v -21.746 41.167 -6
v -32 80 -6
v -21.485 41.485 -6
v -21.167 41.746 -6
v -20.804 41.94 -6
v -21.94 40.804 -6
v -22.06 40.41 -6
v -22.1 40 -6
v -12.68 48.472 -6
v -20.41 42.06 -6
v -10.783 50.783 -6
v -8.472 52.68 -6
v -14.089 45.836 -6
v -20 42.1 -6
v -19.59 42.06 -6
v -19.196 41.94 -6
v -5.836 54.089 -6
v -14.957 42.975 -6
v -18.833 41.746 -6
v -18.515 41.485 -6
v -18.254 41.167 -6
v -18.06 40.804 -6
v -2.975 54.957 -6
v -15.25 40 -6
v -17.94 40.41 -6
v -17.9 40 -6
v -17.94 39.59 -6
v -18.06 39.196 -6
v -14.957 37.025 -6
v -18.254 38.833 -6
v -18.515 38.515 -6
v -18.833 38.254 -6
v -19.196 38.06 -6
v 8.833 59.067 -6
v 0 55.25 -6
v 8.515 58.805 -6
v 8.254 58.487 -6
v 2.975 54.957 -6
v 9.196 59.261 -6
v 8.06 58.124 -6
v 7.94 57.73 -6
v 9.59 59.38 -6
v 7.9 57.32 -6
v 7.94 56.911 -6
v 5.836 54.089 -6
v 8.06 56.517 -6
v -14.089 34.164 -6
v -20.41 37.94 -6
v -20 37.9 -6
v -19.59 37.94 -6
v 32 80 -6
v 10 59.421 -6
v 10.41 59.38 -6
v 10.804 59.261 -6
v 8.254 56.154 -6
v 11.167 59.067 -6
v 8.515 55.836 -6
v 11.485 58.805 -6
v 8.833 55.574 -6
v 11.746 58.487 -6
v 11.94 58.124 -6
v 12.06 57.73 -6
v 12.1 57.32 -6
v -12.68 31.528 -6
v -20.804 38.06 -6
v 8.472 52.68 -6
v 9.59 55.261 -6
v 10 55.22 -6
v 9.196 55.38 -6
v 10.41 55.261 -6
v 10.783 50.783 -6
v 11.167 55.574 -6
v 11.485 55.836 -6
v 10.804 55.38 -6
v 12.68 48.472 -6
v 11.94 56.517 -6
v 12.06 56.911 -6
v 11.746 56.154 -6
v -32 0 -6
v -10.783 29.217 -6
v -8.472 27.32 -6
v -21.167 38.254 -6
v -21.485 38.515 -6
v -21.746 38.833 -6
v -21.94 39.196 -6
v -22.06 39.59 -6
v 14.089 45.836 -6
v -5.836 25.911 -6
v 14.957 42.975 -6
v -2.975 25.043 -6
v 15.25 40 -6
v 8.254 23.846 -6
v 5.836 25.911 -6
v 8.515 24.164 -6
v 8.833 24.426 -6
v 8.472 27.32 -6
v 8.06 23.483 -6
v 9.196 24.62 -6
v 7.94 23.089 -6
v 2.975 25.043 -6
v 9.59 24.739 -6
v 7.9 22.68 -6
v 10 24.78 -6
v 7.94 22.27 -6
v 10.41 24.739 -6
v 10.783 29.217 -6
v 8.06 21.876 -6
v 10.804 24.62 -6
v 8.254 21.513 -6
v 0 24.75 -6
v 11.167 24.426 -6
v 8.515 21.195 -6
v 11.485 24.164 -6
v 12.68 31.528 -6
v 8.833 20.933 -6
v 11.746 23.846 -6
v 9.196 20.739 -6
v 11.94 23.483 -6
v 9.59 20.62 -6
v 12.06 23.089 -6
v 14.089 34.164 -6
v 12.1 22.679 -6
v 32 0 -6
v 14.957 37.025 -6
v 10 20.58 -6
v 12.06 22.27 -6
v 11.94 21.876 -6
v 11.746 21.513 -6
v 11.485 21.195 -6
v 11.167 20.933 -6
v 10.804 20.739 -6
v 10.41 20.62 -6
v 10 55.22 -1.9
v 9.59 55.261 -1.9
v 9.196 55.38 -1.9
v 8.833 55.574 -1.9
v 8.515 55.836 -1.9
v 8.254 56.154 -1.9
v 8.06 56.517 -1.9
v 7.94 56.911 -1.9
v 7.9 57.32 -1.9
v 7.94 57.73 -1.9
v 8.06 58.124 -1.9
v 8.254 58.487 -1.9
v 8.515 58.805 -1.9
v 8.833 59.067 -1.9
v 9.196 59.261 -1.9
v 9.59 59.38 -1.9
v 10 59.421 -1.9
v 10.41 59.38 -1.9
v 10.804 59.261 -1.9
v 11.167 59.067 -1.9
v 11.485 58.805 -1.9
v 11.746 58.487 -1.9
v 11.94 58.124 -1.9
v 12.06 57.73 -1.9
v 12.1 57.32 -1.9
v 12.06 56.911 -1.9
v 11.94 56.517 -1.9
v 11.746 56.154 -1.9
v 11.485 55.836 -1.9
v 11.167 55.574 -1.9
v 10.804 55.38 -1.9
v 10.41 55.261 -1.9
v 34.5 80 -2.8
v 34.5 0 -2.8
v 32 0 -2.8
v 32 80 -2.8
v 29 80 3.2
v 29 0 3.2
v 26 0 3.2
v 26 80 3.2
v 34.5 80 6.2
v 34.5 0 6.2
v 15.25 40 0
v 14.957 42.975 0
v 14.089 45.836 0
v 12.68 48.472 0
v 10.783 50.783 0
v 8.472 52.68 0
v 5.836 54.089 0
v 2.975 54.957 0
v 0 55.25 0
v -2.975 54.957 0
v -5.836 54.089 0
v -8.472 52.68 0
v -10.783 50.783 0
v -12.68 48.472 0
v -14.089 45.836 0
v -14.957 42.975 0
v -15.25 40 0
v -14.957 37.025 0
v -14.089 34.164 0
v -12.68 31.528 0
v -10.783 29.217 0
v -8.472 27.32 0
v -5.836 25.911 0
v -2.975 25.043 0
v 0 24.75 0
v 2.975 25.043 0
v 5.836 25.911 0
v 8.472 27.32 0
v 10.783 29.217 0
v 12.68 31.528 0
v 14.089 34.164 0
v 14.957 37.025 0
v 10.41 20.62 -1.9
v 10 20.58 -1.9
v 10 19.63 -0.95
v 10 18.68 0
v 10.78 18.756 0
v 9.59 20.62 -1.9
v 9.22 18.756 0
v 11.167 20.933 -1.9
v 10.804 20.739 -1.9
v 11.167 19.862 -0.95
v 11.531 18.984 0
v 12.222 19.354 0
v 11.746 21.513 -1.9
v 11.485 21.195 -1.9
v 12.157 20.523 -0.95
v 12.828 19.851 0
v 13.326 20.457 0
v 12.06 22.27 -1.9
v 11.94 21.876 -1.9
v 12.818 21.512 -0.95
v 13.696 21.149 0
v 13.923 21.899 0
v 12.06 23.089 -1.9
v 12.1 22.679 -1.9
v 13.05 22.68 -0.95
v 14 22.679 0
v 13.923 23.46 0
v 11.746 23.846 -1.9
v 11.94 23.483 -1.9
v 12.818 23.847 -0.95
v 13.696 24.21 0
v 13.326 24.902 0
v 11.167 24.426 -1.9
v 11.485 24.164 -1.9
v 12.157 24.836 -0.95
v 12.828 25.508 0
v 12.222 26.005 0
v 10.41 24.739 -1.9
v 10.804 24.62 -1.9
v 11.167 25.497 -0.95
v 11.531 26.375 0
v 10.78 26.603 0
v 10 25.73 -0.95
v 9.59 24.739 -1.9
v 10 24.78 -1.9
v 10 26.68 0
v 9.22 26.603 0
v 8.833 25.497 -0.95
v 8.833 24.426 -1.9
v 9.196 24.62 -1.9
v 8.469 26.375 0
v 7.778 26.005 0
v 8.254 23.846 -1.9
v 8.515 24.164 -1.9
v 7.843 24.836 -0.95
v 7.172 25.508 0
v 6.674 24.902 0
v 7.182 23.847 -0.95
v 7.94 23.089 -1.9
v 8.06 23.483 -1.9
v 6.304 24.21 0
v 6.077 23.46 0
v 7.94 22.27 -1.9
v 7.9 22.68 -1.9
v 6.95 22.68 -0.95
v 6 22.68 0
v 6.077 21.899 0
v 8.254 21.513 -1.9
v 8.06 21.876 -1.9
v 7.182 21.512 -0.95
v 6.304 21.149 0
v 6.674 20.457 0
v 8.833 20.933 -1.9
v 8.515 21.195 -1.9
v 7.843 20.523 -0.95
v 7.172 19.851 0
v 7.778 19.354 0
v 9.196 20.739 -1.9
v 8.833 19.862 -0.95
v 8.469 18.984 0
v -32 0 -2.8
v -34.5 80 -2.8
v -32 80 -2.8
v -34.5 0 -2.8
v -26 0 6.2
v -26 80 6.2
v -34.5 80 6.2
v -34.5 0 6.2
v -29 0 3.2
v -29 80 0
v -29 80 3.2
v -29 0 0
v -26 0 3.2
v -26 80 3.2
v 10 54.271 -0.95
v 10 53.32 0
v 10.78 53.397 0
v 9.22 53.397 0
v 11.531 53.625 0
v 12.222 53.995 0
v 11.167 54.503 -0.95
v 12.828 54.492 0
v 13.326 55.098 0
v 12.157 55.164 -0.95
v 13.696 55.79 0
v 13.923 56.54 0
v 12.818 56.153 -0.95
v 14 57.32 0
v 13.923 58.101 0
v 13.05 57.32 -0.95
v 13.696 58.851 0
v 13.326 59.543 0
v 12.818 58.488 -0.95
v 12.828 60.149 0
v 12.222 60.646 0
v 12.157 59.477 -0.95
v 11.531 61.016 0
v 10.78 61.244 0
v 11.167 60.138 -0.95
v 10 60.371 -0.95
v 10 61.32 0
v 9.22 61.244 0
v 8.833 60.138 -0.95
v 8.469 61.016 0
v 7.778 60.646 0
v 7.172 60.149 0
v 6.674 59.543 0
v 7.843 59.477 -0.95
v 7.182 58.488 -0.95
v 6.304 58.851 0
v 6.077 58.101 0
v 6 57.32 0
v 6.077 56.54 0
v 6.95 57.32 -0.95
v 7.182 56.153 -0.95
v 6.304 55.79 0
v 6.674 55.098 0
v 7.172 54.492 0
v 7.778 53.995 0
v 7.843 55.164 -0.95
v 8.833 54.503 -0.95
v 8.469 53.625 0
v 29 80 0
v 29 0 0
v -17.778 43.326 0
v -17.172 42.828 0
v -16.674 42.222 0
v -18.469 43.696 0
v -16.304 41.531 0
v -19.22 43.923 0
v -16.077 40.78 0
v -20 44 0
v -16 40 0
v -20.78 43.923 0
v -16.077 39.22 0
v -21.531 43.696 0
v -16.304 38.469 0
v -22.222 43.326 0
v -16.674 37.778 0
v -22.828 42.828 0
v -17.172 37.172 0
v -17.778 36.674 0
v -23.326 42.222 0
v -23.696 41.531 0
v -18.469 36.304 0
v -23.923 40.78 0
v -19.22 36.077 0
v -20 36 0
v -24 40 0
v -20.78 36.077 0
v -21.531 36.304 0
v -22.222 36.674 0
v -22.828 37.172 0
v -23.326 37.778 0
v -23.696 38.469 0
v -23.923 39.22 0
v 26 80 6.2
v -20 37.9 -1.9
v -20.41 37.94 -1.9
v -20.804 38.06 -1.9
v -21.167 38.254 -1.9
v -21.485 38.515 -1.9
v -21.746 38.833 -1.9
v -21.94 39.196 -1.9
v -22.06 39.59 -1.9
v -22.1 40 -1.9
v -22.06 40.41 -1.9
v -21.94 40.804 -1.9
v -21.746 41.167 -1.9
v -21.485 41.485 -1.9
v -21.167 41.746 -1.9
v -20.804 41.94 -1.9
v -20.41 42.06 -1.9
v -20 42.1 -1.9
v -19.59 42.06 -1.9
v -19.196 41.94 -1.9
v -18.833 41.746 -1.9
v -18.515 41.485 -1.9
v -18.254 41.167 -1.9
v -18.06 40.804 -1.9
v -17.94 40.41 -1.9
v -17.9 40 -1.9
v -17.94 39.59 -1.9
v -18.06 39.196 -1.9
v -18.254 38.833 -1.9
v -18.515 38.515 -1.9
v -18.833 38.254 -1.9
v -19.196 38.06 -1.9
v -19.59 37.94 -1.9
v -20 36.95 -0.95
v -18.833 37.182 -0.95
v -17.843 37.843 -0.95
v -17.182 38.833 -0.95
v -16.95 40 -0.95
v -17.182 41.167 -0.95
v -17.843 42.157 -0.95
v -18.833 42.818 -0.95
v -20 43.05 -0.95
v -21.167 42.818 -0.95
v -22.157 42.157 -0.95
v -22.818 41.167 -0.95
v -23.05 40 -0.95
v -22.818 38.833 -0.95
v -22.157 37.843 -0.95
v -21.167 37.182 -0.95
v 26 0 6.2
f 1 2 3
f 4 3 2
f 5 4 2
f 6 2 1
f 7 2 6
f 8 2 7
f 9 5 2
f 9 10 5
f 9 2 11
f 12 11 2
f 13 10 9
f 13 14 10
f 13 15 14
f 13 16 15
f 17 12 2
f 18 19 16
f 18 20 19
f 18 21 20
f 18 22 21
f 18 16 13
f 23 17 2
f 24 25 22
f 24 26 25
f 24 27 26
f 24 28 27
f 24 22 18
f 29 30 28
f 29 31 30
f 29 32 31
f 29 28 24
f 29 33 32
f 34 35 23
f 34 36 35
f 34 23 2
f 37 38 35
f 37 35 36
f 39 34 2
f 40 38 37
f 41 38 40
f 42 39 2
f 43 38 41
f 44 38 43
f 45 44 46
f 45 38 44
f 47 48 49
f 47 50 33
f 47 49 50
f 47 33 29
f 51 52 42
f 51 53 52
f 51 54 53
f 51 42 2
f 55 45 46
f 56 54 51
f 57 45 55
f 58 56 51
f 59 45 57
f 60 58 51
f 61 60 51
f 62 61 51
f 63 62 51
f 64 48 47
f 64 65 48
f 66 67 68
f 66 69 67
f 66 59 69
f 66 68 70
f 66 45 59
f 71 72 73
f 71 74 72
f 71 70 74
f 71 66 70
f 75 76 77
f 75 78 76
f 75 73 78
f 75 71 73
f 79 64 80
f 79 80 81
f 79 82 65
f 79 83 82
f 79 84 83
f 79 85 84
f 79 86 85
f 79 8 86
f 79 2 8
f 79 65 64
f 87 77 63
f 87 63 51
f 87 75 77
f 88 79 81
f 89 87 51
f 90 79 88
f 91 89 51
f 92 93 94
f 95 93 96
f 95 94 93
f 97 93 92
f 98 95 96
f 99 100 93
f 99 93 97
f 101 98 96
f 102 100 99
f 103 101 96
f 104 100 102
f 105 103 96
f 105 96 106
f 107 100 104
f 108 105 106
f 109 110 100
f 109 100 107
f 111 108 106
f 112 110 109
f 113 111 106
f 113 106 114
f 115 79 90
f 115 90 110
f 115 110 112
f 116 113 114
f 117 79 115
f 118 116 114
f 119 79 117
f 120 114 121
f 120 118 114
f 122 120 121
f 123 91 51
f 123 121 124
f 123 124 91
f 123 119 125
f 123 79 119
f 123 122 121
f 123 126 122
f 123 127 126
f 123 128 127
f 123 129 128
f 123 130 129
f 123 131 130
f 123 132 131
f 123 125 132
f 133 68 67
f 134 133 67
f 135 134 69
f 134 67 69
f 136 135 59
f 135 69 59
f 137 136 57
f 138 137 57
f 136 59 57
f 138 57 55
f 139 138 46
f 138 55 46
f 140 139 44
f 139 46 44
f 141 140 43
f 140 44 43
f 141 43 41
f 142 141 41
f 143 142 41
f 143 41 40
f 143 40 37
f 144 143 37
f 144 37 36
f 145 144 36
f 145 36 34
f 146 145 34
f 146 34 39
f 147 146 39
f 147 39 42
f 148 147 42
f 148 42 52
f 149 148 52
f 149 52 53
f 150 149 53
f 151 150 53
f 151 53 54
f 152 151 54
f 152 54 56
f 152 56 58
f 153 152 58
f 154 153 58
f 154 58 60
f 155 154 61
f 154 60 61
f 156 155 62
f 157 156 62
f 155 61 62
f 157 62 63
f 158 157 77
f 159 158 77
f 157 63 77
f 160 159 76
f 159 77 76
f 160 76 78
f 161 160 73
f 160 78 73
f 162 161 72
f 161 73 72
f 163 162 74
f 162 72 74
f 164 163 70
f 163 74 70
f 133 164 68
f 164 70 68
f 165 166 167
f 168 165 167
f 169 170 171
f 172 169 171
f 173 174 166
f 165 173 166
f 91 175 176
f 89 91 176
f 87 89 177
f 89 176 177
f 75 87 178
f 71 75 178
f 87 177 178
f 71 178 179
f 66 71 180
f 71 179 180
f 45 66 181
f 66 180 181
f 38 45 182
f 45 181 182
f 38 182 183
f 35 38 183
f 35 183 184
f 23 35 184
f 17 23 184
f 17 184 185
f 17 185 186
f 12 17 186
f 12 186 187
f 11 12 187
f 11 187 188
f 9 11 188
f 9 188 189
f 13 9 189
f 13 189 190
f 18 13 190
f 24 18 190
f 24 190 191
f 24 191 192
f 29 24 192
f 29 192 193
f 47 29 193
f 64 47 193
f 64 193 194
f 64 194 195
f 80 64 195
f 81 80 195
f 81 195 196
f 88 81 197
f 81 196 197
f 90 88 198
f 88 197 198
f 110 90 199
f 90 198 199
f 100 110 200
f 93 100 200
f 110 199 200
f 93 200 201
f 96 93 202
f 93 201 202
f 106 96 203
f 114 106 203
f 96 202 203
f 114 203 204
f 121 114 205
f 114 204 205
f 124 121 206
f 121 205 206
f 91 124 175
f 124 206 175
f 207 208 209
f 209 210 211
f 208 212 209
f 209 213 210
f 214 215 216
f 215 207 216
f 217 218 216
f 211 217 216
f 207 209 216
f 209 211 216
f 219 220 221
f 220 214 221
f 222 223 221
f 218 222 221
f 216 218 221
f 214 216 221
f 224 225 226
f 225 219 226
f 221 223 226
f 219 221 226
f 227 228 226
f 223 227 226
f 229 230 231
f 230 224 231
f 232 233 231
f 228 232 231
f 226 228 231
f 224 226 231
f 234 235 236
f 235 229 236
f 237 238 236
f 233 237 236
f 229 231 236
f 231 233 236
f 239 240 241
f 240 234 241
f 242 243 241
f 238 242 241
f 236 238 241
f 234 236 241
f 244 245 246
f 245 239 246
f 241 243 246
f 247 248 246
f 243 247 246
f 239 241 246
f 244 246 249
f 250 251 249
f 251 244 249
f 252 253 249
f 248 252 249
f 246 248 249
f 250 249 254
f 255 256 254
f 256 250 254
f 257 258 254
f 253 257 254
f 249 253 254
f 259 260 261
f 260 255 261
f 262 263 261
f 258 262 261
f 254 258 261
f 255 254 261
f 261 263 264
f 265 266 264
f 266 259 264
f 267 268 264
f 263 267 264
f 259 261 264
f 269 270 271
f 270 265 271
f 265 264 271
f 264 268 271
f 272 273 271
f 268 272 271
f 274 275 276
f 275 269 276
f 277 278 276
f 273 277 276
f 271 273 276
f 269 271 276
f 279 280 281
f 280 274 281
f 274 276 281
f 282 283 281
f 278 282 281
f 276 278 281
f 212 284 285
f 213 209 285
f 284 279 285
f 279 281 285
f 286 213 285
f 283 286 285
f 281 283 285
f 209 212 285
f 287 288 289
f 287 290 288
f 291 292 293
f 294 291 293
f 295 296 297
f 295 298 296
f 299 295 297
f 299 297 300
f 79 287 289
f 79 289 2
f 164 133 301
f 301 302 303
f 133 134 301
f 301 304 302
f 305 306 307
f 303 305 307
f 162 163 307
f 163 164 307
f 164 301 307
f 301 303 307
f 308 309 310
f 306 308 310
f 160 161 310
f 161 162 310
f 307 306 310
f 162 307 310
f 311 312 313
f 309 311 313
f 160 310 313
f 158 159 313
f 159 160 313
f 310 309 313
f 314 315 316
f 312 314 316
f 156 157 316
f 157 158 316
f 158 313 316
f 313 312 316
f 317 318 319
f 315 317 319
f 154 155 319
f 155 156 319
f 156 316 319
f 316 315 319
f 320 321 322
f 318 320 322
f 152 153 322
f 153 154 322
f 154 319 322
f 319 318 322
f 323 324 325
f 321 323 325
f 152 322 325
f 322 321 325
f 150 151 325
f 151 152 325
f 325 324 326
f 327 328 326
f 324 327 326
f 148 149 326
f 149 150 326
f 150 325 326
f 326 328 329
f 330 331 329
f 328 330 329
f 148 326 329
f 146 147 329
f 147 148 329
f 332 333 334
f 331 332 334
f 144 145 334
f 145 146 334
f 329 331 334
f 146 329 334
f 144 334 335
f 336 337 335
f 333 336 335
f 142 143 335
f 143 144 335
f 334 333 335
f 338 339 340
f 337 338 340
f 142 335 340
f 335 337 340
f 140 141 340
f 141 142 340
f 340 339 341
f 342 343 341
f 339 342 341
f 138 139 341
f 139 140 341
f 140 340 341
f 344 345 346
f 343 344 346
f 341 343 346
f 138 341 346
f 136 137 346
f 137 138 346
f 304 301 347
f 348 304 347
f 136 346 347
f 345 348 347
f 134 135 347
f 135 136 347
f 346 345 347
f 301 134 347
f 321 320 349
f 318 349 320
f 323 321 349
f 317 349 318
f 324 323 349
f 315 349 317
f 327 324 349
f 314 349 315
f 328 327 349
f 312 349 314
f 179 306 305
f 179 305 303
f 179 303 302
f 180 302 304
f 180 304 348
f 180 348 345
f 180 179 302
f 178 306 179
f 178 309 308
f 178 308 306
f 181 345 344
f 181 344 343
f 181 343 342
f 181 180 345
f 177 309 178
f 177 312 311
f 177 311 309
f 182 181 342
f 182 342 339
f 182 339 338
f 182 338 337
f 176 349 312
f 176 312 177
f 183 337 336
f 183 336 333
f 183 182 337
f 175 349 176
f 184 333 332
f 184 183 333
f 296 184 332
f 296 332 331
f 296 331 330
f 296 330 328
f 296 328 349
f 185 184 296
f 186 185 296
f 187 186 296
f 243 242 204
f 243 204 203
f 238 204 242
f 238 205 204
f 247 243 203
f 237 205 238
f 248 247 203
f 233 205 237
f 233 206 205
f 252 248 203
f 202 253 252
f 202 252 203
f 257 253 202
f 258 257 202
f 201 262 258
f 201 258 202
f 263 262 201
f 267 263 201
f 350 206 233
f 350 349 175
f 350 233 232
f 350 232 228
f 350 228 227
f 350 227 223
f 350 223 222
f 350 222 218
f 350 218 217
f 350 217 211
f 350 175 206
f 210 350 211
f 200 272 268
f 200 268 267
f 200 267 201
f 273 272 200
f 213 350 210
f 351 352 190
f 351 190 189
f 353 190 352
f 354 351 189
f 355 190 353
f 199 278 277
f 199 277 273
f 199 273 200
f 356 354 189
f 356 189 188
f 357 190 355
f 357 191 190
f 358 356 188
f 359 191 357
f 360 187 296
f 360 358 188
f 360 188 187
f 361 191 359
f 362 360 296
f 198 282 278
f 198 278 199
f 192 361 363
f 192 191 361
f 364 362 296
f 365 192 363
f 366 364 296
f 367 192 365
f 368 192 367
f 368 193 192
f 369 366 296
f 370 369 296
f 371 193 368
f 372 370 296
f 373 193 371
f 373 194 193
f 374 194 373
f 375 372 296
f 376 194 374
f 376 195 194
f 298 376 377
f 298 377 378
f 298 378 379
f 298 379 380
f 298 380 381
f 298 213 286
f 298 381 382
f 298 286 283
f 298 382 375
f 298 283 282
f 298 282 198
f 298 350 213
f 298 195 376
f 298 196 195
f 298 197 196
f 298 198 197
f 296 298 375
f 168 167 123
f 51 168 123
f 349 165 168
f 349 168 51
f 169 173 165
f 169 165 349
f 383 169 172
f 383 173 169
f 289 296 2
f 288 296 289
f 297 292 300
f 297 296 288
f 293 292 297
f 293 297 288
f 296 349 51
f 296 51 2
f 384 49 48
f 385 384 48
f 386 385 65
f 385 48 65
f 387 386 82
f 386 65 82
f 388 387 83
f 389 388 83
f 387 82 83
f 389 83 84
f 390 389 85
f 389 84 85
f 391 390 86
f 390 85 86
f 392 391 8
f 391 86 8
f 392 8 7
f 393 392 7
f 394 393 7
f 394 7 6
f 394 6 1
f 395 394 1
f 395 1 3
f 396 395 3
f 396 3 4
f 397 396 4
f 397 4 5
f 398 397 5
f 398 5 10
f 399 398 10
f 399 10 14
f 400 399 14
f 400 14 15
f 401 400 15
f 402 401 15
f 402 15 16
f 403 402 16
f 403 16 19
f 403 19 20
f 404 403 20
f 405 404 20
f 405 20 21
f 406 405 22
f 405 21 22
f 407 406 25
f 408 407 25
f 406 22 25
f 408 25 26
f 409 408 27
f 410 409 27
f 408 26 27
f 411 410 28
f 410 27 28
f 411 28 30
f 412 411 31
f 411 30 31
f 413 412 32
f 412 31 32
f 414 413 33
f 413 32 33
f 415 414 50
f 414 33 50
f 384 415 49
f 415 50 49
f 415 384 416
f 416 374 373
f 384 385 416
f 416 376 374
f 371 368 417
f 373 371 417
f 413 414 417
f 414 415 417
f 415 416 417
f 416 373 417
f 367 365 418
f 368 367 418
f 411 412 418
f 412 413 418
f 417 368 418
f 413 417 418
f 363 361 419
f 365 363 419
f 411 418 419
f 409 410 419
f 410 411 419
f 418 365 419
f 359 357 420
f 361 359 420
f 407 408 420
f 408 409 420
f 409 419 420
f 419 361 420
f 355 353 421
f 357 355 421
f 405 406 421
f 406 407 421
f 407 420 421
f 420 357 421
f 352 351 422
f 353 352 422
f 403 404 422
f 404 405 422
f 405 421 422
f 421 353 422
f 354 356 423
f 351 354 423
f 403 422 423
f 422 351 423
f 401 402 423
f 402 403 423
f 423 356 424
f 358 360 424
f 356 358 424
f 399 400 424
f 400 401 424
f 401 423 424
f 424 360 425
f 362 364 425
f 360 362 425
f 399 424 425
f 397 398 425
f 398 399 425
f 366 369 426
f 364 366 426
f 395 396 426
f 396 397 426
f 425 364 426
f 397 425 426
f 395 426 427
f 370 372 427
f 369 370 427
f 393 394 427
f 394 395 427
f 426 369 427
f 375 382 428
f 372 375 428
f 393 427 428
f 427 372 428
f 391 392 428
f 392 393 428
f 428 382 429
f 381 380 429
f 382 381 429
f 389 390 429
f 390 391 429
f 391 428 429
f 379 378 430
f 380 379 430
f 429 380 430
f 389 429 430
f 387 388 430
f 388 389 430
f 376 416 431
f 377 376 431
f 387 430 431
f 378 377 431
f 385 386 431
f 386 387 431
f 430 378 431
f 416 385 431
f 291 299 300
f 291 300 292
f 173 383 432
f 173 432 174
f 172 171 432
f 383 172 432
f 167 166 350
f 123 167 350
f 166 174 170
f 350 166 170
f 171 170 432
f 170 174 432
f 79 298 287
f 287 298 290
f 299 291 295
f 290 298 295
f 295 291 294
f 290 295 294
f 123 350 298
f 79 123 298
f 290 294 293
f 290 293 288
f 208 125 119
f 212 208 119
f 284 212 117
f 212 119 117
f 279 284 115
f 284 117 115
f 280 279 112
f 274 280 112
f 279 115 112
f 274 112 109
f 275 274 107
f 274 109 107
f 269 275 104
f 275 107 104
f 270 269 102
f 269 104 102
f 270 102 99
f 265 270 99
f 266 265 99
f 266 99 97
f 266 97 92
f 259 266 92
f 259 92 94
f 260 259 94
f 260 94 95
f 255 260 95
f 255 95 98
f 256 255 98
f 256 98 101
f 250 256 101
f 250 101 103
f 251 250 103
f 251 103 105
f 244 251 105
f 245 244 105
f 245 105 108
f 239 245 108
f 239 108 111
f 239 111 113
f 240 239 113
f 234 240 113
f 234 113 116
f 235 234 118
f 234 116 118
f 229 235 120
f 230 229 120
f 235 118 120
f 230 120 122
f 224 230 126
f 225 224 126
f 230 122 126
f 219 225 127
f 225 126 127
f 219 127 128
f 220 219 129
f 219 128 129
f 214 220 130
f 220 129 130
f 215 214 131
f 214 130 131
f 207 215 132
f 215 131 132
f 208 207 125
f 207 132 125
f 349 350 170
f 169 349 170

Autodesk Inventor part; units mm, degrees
ref_plane "YZ Plane" through (0, 0, 0) normal (1, 0, 0) x (0, 1, 0)
ref_plane "XZ Plane" through (0, 0, 0) normal (0, 1, 0) x (-1, 0, 0)
ref_plane "XY Plane" through (0, 0, 0) normal (0, 0, 1) x (1, 0, 0)
sketch "Sketch2" plane through (0, 0, 0) normal (0, 1, 0) x (-1, 0, 0)
  circle A0 centre (0, 0) radius 15.25
  circle A1 centre (0, 0) radius 25 construction
  circle A2 centre (0, -105) radius 68.1
  line L0 (-85.4561, 0) -> (89.9732, 0) construction
  line L1 (0, 101.2907) -> (0, -205.3562) construction
  circle A3 centre (0, -105) radius 72
  line L2 (53.1573, -36.9) -> (-40.009, -36.9) construction
  line L3 (26.7586, 36.9) -> (26.7586, -36.9)
  line L4 (-26.7586, 36.9) -> (-26.7586, -36.9)
  line L5 (26.7586, -36.9) -> (-26.7586, -36.9)
  line L6 (34.2741, -33.2) -> (-37.5386, -33.2) construction
  line L7 (0, 0) -> (20, 0)
  line L8 (0, 0) -> (-10, 17.3205)
  line L9 (0, 0) -> (-10, -17.3205)
  line L10 (0, 17.3205) -> (-18.0278, 17.3205) construction
  line L11 (0, -17.3205) -> (-18.0278, -17.3205) construction
  circle A4 centre (-10, 17.3205) radius 2.1
  circle A5 centre (20, 0) radius 2.1
  circle A6 centre (-10, -17.3205) radius 2.1
  line L12 (26.7586, 36.9) -> (-26.7586, 36.9)
  dimension "d22" = 30.5
  dimension "d23" = 50
  dimension "d24" = 136.2
  dimension "d25" = 105
  dimension "d26" = 144
  dimension "d40" = 120
  dimension "d41" = 120
  dimension "d42" = 20
  dimension "d43" = 4.2
sketch "Sketch4" plane through (0, 0, 0) normal (0, 1, 0) x (-1, 0, 0)
  line L0 (0, 0) -> (29, 0)
  line L1 (29, 0) -> (29, 3.2)
  line L2 (29, 3.2) -> (26, 3.2)
  line L3 (26, 3.2) -> (26, 6.2)
  line L4 (26, 6.2) -> (34.5, 6.2)
  line L5 (34.5, 6.2) -> (34.5, -2.8)
  line L6 (34.5, -2.8) -> (32, -2.8)
  line L7 (32, -2.8) -> (32, -6)
  line L8 (32, -6) -> (0, -6)
  line L9 (0, -6) -> (0, 0)
  line L10 (0, 0) -> (-29, 0)
  line L11 (-29, 0) -> (-29, 3.2)
  line L12 (-29, 3.2) -> (-26, 3.2)
  line L13 (-26, 3.2) -> (-26, 6.2)
  line L14 (-26, 6.2) -> (-34.5, 6.2)
  line L15 (-34.5, 6.2) -> (-34.5, -2.8)
  line L16 (-34.5, -2.8) -> (-32, -2.8)
  line L17 (-32, -2.8) -> (-32, -6)
  line L18 (-32, -6) -> (0, -6)
  dimension "d44" = 3.2
  dimension "d45" = 3.2
  dimension "d46" = 6
  dimension "d47" = 3
  dimension "d48" = 3
  dimension "d49" = 5.5
  dimension "d50" = 3
  dimension "d51" = 26
extrude "Extrusion1" add sketch "Sketch4" along normal blind 80
sketch "Sketch6" plane through (-29, 0, 0) normal (0, 0, 1) x (1, 0, 0)
  line L0 (0, 80) -> (58, 80) projected
  line L1 (0, 0) -> (0, 80) projected
  line L2 (0, 0) -> (58, 0) projected
  line L3 (0, 0) -> (58, 0)
  line L4 (58, 0) -> (58, 80) projected
  line L5 (58, 0) -> (58, 80)
  circle A0 centre (29, 40) radius 25 construction
  line L6 (36.5497, 40) -> (21.3269, 40) construction
  line L7 (29, 31.55) -> (29, 50.9237) construction
  line L8 (29, 40) -> (39, 57.3205) construction
  line L9 (29, 40) -> (9, 40) construction
  line L10 (29, 40) -> (39, 22.6795) construction
  circle A1 centre (29, 40) radius 15.25
  point P0 (29, 0)
  dimension "d54" = 50
  dimension "d56" = 120
  dimension "d57" = 120
  dimension "d58" = 20
  dimension "d59" = 30.5
extrude "Extrusion2" cut sketch "Sketch6" against normal up to surface (6 mm away) contours A1
hole "Hole1" at (10, 22.6795, 0) at (-20, 40, 0) at (10, 57.3205, 0) direction (0, 0, -1) diameter 4.2 end through all countersink diameter 8 countersink angle 90
properties part number "Cycloid_2_base_v2"
